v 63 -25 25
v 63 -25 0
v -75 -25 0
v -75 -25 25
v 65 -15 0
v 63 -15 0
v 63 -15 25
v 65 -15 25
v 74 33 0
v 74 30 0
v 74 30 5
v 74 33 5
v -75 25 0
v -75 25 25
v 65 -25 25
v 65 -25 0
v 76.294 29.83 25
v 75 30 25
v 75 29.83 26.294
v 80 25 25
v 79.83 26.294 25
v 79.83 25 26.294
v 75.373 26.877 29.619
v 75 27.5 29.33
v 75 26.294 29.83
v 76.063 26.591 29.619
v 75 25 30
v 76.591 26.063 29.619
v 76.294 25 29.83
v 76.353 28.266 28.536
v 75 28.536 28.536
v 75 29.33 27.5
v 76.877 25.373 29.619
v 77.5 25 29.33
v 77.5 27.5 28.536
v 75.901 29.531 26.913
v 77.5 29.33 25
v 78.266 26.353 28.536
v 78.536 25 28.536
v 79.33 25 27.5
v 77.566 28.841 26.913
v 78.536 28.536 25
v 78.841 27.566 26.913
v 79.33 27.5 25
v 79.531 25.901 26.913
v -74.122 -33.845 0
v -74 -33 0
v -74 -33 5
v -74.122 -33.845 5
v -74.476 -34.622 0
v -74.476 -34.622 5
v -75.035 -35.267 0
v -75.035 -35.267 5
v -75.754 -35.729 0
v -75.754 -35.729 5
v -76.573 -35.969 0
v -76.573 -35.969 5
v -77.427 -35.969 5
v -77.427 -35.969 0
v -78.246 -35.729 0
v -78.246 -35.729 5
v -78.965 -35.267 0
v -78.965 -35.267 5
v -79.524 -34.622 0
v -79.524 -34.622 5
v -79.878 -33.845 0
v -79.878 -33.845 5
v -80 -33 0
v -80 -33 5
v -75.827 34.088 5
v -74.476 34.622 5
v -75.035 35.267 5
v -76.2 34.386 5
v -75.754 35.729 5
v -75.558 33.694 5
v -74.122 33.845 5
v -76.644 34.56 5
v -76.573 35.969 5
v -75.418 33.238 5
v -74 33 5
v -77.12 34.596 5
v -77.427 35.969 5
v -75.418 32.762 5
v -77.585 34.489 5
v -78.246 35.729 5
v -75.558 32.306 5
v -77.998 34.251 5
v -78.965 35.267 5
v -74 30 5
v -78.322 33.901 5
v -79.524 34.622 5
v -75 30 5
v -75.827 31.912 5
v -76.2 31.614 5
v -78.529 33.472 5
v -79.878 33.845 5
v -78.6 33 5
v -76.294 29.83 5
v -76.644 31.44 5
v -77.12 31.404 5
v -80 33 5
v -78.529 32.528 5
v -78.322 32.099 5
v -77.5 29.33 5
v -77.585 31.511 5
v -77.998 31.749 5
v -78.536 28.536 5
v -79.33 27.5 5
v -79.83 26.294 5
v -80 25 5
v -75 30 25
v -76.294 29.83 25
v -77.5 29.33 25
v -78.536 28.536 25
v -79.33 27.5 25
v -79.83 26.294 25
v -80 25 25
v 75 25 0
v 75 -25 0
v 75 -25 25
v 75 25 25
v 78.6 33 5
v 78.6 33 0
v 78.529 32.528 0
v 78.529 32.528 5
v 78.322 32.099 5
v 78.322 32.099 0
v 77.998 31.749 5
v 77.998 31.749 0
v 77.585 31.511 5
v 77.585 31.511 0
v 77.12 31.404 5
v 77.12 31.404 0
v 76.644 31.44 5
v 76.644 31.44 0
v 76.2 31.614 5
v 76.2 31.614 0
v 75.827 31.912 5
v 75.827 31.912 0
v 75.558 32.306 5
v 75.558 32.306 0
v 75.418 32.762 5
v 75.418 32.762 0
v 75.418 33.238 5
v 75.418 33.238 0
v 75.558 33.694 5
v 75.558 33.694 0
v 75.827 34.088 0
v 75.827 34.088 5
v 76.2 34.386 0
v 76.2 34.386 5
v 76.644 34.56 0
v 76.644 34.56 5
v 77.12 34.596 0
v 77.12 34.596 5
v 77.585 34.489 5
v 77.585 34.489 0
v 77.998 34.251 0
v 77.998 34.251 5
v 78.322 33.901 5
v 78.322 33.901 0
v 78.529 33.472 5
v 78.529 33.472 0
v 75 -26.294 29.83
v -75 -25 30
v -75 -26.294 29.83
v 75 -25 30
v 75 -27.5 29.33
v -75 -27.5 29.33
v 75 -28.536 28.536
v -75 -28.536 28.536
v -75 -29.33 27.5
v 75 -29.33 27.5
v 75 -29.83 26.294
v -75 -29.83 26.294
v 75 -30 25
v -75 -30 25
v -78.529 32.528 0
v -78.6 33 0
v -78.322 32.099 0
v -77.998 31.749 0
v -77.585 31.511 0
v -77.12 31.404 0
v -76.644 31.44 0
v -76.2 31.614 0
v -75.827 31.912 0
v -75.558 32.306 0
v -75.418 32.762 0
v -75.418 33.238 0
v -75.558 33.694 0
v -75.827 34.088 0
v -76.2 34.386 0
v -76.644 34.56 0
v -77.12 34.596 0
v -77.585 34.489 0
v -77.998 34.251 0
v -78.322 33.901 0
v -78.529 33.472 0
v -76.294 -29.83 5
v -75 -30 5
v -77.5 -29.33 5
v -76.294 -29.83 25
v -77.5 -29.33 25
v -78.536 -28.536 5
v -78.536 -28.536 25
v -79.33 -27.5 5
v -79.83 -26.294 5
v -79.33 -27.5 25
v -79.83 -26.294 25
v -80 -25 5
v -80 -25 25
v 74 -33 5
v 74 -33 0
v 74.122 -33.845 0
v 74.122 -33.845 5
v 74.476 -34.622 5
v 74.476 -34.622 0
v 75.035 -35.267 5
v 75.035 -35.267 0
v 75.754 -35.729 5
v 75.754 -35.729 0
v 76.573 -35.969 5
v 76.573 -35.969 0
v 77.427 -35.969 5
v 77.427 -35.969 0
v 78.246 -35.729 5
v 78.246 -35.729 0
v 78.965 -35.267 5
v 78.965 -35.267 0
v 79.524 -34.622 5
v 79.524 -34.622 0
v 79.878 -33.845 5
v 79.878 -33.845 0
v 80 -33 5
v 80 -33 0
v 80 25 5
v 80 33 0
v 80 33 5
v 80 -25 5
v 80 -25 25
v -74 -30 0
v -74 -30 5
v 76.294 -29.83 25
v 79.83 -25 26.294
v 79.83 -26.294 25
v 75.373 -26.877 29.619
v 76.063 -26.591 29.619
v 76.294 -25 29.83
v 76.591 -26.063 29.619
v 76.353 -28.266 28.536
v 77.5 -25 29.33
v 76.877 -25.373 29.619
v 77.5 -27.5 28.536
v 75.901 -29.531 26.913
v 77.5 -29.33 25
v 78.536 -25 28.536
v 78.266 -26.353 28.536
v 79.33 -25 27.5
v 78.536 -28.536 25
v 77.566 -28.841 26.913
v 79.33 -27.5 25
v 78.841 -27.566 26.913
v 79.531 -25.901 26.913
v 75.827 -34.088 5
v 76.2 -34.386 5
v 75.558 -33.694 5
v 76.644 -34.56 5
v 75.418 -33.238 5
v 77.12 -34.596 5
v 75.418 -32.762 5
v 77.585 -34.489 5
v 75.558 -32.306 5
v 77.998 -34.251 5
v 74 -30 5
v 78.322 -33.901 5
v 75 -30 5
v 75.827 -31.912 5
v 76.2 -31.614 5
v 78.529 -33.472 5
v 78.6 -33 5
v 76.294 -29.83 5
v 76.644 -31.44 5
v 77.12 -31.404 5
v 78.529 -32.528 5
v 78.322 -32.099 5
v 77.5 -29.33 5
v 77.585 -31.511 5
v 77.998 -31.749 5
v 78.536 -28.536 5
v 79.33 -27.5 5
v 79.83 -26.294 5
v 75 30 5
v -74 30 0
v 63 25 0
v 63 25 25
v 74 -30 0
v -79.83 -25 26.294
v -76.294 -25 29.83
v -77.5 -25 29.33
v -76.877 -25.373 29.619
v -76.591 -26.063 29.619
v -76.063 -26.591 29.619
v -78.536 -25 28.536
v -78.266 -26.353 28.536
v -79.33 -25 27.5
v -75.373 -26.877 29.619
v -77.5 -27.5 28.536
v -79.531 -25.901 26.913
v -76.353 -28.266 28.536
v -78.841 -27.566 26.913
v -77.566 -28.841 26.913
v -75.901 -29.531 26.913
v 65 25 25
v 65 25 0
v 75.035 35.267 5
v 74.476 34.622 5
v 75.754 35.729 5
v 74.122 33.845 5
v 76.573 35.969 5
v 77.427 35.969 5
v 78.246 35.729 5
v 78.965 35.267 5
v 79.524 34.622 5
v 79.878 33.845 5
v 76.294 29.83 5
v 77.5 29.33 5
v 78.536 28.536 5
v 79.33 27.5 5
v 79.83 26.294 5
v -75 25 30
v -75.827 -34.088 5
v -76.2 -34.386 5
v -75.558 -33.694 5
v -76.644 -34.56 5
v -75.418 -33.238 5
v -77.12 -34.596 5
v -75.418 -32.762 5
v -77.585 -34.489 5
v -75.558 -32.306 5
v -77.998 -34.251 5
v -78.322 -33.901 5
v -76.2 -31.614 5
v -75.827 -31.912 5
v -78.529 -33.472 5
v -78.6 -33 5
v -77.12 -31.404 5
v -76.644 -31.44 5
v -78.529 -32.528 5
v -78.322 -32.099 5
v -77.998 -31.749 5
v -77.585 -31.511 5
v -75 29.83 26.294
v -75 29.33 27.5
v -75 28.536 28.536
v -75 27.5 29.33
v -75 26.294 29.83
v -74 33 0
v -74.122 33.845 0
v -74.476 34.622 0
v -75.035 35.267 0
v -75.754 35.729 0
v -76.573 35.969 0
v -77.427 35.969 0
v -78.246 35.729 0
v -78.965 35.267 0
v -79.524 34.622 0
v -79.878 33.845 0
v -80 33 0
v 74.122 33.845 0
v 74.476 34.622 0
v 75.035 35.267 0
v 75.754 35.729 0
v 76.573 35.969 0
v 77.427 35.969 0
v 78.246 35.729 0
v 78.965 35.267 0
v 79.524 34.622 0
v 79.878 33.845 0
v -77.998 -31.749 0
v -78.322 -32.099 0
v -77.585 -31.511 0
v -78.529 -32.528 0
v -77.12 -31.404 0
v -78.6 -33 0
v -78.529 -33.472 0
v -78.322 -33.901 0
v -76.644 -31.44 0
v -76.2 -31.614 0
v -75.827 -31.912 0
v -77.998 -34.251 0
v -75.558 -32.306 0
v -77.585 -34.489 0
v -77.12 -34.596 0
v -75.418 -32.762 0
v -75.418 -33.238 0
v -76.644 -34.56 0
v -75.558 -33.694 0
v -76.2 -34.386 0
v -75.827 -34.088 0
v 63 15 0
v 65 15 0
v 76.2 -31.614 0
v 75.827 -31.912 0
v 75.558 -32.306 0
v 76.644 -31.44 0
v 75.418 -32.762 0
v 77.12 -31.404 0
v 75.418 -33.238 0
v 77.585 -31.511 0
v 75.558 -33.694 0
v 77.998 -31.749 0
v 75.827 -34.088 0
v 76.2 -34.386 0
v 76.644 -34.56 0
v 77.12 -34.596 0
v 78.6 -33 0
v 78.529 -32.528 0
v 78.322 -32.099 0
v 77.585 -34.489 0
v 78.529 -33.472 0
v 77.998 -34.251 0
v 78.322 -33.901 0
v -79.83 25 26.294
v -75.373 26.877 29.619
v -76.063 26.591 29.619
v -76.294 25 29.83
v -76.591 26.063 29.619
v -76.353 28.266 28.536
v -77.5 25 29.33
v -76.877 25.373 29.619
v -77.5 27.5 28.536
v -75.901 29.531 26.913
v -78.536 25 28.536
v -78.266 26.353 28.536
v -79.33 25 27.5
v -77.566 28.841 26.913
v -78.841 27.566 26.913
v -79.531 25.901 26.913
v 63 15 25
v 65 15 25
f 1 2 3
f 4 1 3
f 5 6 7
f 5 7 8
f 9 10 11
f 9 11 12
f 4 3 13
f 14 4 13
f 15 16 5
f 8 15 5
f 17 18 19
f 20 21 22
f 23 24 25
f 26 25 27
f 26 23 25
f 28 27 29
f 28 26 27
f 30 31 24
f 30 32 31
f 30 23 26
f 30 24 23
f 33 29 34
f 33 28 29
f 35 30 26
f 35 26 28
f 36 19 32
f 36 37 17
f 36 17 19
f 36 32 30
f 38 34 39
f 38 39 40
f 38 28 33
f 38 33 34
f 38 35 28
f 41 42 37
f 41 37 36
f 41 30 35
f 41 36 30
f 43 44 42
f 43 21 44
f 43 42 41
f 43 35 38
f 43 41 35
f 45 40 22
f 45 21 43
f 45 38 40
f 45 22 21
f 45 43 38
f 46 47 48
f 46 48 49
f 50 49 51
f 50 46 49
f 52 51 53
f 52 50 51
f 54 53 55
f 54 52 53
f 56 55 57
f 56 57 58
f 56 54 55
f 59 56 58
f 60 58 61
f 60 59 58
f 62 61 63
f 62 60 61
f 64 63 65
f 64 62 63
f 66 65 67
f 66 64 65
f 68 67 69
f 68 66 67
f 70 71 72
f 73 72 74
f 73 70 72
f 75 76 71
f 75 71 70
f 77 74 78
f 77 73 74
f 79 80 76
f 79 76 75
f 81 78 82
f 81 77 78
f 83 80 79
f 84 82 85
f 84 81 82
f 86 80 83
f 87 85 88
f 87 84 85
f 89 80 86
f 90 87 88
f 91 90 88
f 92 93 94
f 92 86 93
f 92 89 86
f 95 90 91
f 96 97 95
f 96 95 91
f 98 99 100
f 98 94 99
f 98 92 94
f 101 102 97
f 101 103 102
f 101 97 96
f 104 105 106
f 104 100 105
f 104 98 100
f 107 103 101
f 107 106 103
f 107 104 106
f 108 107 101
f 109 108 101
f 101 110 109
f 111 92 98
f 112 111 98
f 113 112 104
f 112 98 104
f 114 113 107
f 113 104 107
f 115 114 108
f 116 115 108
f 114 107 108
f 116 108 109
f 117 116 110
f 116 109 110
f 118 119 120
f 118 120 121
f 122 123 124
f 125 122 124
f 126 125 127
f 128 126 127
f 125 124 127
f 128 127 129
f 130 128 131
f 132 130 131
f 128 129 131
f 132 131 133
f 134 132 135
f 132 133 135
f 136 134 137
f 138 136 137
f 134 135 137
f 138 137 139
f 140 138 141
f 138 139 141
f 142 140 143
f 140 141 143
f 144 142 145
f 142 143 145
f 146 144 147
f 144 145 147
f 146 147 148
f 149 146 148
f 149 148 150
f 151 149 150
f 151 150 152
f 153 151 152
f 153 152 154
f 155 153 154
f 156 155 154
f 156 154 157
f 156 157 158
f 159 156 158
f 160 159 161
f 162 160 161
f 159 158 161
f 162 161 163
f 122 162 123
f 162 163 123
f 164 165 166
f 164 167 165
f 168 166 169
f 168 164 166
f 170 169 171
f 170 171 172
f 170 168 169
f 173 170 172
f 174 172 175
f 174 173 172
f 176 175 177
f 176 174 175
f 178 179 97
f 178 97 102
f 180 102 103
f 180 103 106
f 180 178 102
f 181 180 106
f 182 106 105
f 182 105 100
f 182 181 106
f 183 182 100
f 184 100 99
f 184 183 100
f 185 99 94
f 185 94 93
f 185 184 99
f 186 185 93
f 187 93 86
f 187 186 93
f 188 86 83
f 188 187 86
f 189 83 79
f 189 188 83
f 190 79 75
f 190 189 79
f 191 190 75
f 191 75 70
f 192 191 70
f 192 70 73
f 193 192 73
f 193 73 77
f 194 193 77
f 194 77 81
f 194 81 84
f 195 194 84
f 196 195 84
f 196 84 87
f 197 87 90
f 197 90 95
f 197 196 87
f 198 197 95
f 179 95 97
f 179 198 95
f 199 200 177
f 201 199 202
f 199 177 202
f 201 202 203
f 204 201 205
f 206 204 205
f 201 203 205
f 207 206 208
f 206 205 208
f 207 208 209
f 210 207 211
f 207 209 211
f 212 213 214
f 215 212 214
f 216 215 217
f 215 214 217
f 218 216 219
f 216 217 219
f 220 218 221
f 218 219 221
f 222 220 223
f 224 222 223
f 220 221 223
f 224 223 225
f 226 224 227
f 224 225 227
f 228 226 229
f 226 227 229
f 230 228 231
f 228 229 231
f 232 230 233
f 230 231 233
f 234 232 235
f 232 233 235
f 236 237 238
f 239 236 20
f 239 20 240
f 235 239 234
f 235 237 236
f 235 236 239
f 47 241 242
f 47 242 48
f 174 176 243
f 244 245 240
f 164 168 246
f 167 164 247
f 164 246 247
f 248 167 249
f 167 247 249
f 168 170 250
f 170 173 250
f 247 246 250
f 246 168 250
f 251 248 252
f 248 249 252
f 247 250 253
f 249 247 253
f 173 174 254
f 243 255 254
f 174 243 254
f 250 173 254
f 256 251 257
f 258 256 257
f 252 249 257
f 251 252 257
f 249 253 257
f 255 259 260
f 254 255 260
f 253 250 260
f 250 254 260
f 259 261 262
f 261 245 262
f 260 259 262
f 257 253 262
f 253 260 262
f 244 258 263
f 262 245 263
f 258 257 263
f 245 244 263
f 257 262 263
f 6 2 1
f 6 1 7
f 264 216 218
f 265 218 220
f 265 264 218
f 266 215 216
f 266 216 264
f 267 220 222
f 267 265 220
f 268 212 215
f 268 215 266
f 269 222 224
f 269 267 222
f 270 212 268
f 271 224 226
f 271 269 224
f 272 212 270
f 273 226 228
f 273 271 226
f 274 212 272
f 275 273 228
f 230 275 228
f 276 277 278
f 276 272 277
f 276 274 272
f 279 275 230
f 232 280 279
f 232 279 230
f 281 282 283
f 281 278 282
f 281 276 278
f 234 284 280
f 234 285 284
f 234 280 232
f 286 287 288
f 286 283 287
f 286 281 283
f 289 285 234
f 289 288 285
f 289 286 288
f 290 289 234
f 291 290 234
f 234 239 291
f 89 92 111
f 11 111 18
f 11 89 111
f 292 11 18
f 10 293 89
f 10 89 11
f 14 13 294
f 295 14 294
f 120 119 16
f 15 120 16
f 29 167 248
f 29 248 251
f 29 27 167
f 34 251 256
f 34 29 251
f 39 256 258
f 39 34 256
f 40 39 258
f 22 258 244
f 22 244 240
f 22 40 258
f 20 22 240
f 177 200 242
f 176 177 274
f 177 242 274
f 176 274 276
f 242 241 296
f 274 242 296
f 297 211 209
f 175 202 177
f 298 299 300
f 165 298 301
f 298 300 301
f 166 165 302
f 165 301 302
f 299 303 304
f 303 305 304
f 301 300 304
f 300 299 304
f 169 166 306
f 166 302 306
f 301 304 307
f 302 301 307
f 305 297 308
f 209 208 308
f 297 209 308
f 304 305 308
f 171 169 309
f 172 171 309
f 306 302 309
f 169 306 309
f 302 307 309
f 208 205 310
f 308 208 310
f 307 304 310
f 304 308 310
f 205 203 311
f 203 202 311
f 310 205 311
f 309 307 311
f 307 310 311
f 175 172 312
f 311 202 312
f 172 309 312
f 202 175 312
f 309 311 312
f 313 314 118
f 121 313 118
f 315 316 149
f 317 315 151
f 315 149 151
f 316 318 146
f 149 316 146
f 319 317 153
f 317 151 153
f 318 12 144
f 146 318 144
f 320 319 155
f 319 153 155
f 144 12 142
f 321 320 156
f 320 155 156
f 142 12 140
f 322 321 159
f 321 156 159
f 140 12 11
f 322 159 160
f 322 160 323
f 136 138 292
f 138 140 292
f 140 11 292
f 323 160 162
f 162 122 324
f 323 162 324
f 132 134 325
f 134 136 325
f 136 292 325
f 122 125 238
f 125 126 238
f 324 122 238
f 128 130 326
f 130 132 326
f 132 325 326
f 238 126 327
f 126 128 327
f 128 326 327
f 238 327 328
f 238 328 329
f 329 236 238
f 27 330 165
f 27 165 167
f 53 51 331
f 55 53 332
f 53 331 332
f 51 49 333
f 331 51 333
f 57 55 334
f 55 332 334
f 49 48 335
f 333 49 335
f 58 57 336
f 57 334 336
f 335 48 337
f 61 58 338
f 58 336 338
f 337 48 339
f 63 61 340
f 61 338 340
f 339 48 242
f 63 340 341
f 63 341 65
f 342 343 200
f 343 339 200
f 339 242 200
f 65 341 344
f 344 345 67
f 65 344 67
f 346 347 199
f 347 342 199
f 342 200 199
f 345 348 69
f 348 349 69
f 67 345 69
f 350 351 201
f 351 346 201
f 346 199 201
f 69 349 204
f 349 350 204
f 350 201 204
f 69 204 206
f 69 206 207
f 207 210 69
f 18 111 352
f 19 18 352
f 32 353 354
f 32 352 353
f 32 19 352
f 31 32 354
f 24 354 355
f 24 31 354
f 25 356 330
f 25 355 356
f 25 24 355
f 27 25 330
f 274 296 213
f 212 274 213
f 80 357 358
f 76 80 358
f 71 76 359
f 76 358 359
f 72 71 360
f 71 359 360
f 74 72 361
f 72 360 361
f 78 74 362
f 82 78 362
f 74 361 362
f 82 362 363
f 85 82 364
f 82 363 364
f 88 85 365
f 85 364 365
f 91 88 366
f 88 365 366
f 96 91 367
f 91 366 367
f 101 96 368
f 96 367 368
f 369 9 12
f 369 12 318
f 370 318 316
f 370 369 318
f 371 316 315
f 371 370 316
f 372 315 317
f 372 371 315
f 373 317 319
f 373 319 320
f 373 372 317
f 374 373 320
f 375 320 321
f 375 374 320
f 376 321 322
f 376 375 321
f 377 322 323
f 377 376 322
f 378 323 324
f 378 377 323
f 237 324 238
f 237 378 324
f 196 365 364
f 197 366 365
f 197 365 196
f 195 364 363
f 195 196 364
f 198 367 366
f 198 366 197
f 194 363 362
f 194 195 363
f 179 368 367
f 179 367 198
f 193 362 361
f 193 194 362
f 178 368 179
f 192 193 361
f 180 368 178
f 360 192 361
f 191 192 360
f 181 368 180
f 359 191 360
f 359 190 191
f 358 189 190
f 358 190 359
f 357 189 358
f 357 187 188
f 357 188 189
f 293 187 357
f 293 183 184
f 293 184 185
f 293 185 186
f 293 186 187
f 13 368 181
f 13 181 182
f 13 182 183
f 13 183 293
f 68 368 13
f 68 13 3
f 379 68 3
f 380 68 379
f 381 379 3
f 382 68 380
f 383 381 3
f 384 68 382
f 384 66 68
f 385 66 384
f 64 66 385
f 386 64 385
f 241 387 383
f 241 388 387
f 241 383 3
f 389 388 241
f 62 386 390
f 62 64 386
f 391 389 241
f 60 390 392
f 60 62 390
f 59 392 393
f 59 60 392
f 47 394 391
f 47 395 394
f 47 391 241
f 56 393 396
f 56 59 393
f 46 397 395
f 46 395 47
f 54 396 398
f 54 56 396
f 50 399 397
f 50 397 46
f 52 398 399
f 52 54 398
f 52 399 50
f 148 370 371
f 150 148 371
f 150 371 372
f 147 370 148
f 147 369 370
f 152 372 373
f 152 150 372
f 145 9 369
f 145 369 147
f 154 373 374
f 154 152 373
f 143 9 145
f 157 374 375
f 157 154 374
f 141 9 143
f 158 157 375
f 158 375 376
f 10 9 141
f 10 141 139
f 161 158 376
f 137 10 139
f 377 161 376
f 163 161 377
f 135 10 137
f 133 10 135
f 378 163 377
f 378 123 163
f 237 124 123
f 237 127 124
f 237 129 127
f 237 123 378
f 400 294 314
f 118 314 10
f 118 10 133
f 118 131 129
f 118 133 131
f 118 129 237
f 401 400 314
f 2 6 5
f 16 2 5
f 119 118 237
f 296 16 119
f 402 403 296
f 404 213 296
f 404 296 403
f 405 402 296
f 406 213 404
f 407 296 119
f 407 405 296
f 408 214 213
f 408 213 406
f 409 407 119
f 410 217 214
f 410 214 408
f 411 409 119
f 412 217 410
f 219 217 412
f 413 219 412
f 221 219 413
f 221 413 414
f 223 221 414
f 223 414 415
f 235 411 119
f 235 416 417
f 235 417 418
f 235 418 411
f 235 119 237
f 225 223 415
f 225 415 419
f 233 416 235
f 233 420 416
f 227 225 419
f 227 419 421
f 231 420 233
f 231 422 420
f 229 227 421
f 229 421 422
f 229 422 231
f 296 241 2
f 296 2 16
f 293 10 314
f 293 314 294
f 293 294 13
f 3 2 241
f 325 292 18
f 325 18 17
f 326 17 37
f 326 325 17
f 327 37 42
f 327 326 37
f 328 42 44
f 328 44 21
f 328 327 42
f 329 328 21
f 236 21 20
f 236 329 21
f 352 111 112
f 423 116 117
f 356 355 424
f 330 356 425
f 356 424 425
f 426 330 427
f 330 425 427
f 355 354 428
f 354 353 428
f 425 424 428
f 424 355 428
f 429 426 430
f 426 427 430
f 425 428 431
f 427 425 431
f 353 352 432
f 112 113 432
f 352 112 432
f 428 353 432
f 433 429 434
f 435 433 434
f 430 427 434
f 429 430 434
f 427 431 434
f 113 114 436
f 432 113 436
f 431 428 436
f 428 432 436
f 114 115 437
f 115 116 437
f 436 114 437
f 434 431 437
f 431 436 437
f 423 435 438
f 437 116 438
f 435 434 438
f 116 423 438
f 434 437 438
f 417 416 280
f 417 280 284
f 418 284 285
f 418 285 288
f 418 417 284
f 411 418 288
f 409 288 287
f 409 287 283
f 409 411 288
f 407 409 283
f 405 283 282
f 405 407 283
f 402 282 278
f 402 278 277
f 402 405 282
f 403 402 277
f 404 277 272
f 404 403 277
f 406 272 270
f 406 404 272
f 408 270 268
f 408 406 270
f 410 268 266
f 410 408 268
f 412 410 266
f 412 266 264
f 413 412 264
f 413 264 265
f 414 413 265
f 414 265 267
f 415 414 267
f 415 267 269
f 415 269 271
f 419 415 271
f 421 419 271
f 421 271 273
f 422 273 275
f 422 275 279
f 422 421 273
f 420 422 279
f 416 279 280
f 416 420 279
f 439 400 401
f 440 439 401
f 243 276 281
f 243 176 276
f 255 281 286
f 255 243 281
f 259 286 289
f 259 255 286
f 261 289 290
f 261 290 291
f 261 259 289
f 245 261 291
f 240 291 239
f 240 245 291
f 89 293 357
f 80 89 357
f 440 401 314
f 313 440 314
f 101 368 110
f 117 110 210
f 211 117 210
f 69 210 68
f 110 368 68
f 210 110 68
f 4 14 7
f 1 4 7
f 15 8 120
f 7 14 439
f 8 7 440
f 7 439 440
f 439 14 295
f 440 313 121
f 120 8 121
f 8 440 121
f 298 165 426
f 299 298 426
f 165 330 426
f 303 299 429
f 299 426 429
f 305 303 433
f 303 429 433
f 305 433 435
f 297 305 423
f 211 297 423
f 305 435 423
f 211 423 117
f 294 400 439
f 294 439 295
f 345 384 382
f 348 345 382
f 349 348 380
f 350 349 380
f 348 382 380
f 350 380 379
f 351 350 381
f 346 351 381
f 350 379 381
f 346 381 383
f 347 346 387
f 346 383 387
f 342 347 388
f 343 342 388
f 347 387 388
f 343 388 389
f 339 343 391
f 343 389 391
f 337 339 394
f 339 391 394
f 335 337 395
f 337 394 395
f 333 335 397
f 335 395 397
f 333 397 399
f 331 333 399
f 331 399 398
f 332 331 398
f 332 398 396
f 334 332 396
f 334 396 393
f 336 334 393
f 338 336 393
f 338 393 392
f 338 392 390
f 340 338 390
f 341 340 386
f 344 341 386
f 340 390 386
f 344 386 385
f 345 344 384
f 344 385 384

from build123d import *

# Parameters (mm, degrees)
SKETCH1_W                 = 5
SKETCH1_H                 = 50
SKETCH1_H_2               = 60
SKETCH1_W_2               = 2
SKETCH1_H_3               = 10
BOSS_EXTRUDE1_DEPTH       = 25
SKETCH2_W                 = 160
SKETCH2_H                 = 60
BOSS_EXTRUDE2_DEPTH       = 5
SKETCH5_R                 = 3
SKETCH5_R_2               = 1.6
BOSS_EXTRUDE3_DEPTH       = 5
MIRROR2_COPY_1_SKETCH_R   = 3
MIRROR2_COPY_1_SKETCH_R_2 = 1.6
MIRROR2_COPY_1_DEPTH      = 5
FILLET1_R                 = 5


with BuildPart() as part:
    # Sketch1 → Boss-Extrude1 (new body)
    with BuildSketch(Plane.XY):
        with Locations((77.5, 0)):
            Rectangle(SKETCH1_W, SKETCH1_H)
        Polygon((-75, -25), (-75, -30), (80, -30), (80, -25), (75, -25), (65, -25), (63, -25), align=None)
        with Locations((-77.5, 0)):
            Rectangle(SKETCH1_W, SKETCH1_H_2)
        Polygon((80, 30), (-75, 30), (-75, 25), (63, 25), (65, 25), (75, 25), (80, 25), align=None)
        with Locations((64, -20)):
            Rectangle(SKETCH1_W_2, SKETCH1_H_3)
        with Locations((64, 20)):
            Rectangle(SKETCH1_W_2, SKETCH1_H_3)
    extrude(amount=BOSS_EXTRUDE1_DEPTH)

    # Sketch2 → Boss-Extrude2 (add)
    with BuildSketch(Plane.XY.offset(25)):
        Rectangle(SKETCH2_W, SKETCH2_H)
    extrude(amount=BOSS_EXTRUDE2_DEPTH)

    # Sketch5 → Boss-Extrude3 (add)
    with BuildSketch(Plane(origin=(0, 0, 0), x_dir=(-1, 0, 0), z_dir=(0, 0, -1))):
        with Locations((77, -33)):
            Circle(SKETCH5_R)
        with Locations((77, -33)):
            Circle(SKETCH5_R_2, mode=Mode.SUBTRACT)
        with BuildLine():
            ThreePointArc((77, -30), (79.121320344, -30.878679656), (80, -33))
            Line((80, -33), (80, -30))
            Line((80, -30), (77, -30))
        make_face()
        with BuildLine():
            Line((74, -30), (74, -33))
            ThreePointArc((74, -33), (74.878679656, -30.878679656), (77, -30))
            Line((77, -30), (74, -30))
        make_face()
    boss_extrude3 = extrude(amount=-BOSS_EXTRUDE3_DEPTH)

    # Mirror1: Boss-Extrude3 across plane
    add(boss_extrude3.mirror(Plane(origin=(0, 0, 0), x_dir=(0, 0, 1), z_dir=(1, 0, 0))))

    # Mirror2: Boss-Extrude3 across plane
    add(boss_extrude3.mirror(Plane.ZX))

    # Mirror2 copy 1 sketch → Mirror2 copy 1 (add)
    with BuildSketch(Plane(origin=(0, 0, 0), x_dir=(1, 0, 0), z_dir=(0, 0, -1))):
        with Locations((77, -33)):
            Circle(MIRROR2_COPY_1_SKETCH_R)
        with Locations((77, -33)):
            Circle(MIRROR2_COPY_1_SKETCH_R_2, mode=Mode.SUBTRACT)
        with BuildLine():
            ThreePointArc((77, -30), (79.121320344, -30.878679656), (80, -33))
            Line((80, -33), (80, -30))
            Line((80, -30), (77, -30))
        make_face()
        with BuildLine():
            Line((74, -30), (74, -33))
            ThreePointArc((74, -33), (74.878679656, -30.878679656), (77, -30))
            Line((77, -30), (74, -30))
        make_face()
    extrude(amount=-MIRROR2_COPY_1_DEPTH)

    # Fillet1
    fillet1_edges = [part.edges().sort_by_distance(p)[0] for p in [
        (-80, 30, 17.5),
        (80, 30, 17.5),
        (80, -30, 17.5),
        (-80, -30, 17.5),
        (0, 30, 30),
        (-80, 0, 30),
        (0, -30, 30),
        (80, 0, 30),
    ]]
    fillet(fillet1_edges, radius=FILLET1_R)


solid = part.part
